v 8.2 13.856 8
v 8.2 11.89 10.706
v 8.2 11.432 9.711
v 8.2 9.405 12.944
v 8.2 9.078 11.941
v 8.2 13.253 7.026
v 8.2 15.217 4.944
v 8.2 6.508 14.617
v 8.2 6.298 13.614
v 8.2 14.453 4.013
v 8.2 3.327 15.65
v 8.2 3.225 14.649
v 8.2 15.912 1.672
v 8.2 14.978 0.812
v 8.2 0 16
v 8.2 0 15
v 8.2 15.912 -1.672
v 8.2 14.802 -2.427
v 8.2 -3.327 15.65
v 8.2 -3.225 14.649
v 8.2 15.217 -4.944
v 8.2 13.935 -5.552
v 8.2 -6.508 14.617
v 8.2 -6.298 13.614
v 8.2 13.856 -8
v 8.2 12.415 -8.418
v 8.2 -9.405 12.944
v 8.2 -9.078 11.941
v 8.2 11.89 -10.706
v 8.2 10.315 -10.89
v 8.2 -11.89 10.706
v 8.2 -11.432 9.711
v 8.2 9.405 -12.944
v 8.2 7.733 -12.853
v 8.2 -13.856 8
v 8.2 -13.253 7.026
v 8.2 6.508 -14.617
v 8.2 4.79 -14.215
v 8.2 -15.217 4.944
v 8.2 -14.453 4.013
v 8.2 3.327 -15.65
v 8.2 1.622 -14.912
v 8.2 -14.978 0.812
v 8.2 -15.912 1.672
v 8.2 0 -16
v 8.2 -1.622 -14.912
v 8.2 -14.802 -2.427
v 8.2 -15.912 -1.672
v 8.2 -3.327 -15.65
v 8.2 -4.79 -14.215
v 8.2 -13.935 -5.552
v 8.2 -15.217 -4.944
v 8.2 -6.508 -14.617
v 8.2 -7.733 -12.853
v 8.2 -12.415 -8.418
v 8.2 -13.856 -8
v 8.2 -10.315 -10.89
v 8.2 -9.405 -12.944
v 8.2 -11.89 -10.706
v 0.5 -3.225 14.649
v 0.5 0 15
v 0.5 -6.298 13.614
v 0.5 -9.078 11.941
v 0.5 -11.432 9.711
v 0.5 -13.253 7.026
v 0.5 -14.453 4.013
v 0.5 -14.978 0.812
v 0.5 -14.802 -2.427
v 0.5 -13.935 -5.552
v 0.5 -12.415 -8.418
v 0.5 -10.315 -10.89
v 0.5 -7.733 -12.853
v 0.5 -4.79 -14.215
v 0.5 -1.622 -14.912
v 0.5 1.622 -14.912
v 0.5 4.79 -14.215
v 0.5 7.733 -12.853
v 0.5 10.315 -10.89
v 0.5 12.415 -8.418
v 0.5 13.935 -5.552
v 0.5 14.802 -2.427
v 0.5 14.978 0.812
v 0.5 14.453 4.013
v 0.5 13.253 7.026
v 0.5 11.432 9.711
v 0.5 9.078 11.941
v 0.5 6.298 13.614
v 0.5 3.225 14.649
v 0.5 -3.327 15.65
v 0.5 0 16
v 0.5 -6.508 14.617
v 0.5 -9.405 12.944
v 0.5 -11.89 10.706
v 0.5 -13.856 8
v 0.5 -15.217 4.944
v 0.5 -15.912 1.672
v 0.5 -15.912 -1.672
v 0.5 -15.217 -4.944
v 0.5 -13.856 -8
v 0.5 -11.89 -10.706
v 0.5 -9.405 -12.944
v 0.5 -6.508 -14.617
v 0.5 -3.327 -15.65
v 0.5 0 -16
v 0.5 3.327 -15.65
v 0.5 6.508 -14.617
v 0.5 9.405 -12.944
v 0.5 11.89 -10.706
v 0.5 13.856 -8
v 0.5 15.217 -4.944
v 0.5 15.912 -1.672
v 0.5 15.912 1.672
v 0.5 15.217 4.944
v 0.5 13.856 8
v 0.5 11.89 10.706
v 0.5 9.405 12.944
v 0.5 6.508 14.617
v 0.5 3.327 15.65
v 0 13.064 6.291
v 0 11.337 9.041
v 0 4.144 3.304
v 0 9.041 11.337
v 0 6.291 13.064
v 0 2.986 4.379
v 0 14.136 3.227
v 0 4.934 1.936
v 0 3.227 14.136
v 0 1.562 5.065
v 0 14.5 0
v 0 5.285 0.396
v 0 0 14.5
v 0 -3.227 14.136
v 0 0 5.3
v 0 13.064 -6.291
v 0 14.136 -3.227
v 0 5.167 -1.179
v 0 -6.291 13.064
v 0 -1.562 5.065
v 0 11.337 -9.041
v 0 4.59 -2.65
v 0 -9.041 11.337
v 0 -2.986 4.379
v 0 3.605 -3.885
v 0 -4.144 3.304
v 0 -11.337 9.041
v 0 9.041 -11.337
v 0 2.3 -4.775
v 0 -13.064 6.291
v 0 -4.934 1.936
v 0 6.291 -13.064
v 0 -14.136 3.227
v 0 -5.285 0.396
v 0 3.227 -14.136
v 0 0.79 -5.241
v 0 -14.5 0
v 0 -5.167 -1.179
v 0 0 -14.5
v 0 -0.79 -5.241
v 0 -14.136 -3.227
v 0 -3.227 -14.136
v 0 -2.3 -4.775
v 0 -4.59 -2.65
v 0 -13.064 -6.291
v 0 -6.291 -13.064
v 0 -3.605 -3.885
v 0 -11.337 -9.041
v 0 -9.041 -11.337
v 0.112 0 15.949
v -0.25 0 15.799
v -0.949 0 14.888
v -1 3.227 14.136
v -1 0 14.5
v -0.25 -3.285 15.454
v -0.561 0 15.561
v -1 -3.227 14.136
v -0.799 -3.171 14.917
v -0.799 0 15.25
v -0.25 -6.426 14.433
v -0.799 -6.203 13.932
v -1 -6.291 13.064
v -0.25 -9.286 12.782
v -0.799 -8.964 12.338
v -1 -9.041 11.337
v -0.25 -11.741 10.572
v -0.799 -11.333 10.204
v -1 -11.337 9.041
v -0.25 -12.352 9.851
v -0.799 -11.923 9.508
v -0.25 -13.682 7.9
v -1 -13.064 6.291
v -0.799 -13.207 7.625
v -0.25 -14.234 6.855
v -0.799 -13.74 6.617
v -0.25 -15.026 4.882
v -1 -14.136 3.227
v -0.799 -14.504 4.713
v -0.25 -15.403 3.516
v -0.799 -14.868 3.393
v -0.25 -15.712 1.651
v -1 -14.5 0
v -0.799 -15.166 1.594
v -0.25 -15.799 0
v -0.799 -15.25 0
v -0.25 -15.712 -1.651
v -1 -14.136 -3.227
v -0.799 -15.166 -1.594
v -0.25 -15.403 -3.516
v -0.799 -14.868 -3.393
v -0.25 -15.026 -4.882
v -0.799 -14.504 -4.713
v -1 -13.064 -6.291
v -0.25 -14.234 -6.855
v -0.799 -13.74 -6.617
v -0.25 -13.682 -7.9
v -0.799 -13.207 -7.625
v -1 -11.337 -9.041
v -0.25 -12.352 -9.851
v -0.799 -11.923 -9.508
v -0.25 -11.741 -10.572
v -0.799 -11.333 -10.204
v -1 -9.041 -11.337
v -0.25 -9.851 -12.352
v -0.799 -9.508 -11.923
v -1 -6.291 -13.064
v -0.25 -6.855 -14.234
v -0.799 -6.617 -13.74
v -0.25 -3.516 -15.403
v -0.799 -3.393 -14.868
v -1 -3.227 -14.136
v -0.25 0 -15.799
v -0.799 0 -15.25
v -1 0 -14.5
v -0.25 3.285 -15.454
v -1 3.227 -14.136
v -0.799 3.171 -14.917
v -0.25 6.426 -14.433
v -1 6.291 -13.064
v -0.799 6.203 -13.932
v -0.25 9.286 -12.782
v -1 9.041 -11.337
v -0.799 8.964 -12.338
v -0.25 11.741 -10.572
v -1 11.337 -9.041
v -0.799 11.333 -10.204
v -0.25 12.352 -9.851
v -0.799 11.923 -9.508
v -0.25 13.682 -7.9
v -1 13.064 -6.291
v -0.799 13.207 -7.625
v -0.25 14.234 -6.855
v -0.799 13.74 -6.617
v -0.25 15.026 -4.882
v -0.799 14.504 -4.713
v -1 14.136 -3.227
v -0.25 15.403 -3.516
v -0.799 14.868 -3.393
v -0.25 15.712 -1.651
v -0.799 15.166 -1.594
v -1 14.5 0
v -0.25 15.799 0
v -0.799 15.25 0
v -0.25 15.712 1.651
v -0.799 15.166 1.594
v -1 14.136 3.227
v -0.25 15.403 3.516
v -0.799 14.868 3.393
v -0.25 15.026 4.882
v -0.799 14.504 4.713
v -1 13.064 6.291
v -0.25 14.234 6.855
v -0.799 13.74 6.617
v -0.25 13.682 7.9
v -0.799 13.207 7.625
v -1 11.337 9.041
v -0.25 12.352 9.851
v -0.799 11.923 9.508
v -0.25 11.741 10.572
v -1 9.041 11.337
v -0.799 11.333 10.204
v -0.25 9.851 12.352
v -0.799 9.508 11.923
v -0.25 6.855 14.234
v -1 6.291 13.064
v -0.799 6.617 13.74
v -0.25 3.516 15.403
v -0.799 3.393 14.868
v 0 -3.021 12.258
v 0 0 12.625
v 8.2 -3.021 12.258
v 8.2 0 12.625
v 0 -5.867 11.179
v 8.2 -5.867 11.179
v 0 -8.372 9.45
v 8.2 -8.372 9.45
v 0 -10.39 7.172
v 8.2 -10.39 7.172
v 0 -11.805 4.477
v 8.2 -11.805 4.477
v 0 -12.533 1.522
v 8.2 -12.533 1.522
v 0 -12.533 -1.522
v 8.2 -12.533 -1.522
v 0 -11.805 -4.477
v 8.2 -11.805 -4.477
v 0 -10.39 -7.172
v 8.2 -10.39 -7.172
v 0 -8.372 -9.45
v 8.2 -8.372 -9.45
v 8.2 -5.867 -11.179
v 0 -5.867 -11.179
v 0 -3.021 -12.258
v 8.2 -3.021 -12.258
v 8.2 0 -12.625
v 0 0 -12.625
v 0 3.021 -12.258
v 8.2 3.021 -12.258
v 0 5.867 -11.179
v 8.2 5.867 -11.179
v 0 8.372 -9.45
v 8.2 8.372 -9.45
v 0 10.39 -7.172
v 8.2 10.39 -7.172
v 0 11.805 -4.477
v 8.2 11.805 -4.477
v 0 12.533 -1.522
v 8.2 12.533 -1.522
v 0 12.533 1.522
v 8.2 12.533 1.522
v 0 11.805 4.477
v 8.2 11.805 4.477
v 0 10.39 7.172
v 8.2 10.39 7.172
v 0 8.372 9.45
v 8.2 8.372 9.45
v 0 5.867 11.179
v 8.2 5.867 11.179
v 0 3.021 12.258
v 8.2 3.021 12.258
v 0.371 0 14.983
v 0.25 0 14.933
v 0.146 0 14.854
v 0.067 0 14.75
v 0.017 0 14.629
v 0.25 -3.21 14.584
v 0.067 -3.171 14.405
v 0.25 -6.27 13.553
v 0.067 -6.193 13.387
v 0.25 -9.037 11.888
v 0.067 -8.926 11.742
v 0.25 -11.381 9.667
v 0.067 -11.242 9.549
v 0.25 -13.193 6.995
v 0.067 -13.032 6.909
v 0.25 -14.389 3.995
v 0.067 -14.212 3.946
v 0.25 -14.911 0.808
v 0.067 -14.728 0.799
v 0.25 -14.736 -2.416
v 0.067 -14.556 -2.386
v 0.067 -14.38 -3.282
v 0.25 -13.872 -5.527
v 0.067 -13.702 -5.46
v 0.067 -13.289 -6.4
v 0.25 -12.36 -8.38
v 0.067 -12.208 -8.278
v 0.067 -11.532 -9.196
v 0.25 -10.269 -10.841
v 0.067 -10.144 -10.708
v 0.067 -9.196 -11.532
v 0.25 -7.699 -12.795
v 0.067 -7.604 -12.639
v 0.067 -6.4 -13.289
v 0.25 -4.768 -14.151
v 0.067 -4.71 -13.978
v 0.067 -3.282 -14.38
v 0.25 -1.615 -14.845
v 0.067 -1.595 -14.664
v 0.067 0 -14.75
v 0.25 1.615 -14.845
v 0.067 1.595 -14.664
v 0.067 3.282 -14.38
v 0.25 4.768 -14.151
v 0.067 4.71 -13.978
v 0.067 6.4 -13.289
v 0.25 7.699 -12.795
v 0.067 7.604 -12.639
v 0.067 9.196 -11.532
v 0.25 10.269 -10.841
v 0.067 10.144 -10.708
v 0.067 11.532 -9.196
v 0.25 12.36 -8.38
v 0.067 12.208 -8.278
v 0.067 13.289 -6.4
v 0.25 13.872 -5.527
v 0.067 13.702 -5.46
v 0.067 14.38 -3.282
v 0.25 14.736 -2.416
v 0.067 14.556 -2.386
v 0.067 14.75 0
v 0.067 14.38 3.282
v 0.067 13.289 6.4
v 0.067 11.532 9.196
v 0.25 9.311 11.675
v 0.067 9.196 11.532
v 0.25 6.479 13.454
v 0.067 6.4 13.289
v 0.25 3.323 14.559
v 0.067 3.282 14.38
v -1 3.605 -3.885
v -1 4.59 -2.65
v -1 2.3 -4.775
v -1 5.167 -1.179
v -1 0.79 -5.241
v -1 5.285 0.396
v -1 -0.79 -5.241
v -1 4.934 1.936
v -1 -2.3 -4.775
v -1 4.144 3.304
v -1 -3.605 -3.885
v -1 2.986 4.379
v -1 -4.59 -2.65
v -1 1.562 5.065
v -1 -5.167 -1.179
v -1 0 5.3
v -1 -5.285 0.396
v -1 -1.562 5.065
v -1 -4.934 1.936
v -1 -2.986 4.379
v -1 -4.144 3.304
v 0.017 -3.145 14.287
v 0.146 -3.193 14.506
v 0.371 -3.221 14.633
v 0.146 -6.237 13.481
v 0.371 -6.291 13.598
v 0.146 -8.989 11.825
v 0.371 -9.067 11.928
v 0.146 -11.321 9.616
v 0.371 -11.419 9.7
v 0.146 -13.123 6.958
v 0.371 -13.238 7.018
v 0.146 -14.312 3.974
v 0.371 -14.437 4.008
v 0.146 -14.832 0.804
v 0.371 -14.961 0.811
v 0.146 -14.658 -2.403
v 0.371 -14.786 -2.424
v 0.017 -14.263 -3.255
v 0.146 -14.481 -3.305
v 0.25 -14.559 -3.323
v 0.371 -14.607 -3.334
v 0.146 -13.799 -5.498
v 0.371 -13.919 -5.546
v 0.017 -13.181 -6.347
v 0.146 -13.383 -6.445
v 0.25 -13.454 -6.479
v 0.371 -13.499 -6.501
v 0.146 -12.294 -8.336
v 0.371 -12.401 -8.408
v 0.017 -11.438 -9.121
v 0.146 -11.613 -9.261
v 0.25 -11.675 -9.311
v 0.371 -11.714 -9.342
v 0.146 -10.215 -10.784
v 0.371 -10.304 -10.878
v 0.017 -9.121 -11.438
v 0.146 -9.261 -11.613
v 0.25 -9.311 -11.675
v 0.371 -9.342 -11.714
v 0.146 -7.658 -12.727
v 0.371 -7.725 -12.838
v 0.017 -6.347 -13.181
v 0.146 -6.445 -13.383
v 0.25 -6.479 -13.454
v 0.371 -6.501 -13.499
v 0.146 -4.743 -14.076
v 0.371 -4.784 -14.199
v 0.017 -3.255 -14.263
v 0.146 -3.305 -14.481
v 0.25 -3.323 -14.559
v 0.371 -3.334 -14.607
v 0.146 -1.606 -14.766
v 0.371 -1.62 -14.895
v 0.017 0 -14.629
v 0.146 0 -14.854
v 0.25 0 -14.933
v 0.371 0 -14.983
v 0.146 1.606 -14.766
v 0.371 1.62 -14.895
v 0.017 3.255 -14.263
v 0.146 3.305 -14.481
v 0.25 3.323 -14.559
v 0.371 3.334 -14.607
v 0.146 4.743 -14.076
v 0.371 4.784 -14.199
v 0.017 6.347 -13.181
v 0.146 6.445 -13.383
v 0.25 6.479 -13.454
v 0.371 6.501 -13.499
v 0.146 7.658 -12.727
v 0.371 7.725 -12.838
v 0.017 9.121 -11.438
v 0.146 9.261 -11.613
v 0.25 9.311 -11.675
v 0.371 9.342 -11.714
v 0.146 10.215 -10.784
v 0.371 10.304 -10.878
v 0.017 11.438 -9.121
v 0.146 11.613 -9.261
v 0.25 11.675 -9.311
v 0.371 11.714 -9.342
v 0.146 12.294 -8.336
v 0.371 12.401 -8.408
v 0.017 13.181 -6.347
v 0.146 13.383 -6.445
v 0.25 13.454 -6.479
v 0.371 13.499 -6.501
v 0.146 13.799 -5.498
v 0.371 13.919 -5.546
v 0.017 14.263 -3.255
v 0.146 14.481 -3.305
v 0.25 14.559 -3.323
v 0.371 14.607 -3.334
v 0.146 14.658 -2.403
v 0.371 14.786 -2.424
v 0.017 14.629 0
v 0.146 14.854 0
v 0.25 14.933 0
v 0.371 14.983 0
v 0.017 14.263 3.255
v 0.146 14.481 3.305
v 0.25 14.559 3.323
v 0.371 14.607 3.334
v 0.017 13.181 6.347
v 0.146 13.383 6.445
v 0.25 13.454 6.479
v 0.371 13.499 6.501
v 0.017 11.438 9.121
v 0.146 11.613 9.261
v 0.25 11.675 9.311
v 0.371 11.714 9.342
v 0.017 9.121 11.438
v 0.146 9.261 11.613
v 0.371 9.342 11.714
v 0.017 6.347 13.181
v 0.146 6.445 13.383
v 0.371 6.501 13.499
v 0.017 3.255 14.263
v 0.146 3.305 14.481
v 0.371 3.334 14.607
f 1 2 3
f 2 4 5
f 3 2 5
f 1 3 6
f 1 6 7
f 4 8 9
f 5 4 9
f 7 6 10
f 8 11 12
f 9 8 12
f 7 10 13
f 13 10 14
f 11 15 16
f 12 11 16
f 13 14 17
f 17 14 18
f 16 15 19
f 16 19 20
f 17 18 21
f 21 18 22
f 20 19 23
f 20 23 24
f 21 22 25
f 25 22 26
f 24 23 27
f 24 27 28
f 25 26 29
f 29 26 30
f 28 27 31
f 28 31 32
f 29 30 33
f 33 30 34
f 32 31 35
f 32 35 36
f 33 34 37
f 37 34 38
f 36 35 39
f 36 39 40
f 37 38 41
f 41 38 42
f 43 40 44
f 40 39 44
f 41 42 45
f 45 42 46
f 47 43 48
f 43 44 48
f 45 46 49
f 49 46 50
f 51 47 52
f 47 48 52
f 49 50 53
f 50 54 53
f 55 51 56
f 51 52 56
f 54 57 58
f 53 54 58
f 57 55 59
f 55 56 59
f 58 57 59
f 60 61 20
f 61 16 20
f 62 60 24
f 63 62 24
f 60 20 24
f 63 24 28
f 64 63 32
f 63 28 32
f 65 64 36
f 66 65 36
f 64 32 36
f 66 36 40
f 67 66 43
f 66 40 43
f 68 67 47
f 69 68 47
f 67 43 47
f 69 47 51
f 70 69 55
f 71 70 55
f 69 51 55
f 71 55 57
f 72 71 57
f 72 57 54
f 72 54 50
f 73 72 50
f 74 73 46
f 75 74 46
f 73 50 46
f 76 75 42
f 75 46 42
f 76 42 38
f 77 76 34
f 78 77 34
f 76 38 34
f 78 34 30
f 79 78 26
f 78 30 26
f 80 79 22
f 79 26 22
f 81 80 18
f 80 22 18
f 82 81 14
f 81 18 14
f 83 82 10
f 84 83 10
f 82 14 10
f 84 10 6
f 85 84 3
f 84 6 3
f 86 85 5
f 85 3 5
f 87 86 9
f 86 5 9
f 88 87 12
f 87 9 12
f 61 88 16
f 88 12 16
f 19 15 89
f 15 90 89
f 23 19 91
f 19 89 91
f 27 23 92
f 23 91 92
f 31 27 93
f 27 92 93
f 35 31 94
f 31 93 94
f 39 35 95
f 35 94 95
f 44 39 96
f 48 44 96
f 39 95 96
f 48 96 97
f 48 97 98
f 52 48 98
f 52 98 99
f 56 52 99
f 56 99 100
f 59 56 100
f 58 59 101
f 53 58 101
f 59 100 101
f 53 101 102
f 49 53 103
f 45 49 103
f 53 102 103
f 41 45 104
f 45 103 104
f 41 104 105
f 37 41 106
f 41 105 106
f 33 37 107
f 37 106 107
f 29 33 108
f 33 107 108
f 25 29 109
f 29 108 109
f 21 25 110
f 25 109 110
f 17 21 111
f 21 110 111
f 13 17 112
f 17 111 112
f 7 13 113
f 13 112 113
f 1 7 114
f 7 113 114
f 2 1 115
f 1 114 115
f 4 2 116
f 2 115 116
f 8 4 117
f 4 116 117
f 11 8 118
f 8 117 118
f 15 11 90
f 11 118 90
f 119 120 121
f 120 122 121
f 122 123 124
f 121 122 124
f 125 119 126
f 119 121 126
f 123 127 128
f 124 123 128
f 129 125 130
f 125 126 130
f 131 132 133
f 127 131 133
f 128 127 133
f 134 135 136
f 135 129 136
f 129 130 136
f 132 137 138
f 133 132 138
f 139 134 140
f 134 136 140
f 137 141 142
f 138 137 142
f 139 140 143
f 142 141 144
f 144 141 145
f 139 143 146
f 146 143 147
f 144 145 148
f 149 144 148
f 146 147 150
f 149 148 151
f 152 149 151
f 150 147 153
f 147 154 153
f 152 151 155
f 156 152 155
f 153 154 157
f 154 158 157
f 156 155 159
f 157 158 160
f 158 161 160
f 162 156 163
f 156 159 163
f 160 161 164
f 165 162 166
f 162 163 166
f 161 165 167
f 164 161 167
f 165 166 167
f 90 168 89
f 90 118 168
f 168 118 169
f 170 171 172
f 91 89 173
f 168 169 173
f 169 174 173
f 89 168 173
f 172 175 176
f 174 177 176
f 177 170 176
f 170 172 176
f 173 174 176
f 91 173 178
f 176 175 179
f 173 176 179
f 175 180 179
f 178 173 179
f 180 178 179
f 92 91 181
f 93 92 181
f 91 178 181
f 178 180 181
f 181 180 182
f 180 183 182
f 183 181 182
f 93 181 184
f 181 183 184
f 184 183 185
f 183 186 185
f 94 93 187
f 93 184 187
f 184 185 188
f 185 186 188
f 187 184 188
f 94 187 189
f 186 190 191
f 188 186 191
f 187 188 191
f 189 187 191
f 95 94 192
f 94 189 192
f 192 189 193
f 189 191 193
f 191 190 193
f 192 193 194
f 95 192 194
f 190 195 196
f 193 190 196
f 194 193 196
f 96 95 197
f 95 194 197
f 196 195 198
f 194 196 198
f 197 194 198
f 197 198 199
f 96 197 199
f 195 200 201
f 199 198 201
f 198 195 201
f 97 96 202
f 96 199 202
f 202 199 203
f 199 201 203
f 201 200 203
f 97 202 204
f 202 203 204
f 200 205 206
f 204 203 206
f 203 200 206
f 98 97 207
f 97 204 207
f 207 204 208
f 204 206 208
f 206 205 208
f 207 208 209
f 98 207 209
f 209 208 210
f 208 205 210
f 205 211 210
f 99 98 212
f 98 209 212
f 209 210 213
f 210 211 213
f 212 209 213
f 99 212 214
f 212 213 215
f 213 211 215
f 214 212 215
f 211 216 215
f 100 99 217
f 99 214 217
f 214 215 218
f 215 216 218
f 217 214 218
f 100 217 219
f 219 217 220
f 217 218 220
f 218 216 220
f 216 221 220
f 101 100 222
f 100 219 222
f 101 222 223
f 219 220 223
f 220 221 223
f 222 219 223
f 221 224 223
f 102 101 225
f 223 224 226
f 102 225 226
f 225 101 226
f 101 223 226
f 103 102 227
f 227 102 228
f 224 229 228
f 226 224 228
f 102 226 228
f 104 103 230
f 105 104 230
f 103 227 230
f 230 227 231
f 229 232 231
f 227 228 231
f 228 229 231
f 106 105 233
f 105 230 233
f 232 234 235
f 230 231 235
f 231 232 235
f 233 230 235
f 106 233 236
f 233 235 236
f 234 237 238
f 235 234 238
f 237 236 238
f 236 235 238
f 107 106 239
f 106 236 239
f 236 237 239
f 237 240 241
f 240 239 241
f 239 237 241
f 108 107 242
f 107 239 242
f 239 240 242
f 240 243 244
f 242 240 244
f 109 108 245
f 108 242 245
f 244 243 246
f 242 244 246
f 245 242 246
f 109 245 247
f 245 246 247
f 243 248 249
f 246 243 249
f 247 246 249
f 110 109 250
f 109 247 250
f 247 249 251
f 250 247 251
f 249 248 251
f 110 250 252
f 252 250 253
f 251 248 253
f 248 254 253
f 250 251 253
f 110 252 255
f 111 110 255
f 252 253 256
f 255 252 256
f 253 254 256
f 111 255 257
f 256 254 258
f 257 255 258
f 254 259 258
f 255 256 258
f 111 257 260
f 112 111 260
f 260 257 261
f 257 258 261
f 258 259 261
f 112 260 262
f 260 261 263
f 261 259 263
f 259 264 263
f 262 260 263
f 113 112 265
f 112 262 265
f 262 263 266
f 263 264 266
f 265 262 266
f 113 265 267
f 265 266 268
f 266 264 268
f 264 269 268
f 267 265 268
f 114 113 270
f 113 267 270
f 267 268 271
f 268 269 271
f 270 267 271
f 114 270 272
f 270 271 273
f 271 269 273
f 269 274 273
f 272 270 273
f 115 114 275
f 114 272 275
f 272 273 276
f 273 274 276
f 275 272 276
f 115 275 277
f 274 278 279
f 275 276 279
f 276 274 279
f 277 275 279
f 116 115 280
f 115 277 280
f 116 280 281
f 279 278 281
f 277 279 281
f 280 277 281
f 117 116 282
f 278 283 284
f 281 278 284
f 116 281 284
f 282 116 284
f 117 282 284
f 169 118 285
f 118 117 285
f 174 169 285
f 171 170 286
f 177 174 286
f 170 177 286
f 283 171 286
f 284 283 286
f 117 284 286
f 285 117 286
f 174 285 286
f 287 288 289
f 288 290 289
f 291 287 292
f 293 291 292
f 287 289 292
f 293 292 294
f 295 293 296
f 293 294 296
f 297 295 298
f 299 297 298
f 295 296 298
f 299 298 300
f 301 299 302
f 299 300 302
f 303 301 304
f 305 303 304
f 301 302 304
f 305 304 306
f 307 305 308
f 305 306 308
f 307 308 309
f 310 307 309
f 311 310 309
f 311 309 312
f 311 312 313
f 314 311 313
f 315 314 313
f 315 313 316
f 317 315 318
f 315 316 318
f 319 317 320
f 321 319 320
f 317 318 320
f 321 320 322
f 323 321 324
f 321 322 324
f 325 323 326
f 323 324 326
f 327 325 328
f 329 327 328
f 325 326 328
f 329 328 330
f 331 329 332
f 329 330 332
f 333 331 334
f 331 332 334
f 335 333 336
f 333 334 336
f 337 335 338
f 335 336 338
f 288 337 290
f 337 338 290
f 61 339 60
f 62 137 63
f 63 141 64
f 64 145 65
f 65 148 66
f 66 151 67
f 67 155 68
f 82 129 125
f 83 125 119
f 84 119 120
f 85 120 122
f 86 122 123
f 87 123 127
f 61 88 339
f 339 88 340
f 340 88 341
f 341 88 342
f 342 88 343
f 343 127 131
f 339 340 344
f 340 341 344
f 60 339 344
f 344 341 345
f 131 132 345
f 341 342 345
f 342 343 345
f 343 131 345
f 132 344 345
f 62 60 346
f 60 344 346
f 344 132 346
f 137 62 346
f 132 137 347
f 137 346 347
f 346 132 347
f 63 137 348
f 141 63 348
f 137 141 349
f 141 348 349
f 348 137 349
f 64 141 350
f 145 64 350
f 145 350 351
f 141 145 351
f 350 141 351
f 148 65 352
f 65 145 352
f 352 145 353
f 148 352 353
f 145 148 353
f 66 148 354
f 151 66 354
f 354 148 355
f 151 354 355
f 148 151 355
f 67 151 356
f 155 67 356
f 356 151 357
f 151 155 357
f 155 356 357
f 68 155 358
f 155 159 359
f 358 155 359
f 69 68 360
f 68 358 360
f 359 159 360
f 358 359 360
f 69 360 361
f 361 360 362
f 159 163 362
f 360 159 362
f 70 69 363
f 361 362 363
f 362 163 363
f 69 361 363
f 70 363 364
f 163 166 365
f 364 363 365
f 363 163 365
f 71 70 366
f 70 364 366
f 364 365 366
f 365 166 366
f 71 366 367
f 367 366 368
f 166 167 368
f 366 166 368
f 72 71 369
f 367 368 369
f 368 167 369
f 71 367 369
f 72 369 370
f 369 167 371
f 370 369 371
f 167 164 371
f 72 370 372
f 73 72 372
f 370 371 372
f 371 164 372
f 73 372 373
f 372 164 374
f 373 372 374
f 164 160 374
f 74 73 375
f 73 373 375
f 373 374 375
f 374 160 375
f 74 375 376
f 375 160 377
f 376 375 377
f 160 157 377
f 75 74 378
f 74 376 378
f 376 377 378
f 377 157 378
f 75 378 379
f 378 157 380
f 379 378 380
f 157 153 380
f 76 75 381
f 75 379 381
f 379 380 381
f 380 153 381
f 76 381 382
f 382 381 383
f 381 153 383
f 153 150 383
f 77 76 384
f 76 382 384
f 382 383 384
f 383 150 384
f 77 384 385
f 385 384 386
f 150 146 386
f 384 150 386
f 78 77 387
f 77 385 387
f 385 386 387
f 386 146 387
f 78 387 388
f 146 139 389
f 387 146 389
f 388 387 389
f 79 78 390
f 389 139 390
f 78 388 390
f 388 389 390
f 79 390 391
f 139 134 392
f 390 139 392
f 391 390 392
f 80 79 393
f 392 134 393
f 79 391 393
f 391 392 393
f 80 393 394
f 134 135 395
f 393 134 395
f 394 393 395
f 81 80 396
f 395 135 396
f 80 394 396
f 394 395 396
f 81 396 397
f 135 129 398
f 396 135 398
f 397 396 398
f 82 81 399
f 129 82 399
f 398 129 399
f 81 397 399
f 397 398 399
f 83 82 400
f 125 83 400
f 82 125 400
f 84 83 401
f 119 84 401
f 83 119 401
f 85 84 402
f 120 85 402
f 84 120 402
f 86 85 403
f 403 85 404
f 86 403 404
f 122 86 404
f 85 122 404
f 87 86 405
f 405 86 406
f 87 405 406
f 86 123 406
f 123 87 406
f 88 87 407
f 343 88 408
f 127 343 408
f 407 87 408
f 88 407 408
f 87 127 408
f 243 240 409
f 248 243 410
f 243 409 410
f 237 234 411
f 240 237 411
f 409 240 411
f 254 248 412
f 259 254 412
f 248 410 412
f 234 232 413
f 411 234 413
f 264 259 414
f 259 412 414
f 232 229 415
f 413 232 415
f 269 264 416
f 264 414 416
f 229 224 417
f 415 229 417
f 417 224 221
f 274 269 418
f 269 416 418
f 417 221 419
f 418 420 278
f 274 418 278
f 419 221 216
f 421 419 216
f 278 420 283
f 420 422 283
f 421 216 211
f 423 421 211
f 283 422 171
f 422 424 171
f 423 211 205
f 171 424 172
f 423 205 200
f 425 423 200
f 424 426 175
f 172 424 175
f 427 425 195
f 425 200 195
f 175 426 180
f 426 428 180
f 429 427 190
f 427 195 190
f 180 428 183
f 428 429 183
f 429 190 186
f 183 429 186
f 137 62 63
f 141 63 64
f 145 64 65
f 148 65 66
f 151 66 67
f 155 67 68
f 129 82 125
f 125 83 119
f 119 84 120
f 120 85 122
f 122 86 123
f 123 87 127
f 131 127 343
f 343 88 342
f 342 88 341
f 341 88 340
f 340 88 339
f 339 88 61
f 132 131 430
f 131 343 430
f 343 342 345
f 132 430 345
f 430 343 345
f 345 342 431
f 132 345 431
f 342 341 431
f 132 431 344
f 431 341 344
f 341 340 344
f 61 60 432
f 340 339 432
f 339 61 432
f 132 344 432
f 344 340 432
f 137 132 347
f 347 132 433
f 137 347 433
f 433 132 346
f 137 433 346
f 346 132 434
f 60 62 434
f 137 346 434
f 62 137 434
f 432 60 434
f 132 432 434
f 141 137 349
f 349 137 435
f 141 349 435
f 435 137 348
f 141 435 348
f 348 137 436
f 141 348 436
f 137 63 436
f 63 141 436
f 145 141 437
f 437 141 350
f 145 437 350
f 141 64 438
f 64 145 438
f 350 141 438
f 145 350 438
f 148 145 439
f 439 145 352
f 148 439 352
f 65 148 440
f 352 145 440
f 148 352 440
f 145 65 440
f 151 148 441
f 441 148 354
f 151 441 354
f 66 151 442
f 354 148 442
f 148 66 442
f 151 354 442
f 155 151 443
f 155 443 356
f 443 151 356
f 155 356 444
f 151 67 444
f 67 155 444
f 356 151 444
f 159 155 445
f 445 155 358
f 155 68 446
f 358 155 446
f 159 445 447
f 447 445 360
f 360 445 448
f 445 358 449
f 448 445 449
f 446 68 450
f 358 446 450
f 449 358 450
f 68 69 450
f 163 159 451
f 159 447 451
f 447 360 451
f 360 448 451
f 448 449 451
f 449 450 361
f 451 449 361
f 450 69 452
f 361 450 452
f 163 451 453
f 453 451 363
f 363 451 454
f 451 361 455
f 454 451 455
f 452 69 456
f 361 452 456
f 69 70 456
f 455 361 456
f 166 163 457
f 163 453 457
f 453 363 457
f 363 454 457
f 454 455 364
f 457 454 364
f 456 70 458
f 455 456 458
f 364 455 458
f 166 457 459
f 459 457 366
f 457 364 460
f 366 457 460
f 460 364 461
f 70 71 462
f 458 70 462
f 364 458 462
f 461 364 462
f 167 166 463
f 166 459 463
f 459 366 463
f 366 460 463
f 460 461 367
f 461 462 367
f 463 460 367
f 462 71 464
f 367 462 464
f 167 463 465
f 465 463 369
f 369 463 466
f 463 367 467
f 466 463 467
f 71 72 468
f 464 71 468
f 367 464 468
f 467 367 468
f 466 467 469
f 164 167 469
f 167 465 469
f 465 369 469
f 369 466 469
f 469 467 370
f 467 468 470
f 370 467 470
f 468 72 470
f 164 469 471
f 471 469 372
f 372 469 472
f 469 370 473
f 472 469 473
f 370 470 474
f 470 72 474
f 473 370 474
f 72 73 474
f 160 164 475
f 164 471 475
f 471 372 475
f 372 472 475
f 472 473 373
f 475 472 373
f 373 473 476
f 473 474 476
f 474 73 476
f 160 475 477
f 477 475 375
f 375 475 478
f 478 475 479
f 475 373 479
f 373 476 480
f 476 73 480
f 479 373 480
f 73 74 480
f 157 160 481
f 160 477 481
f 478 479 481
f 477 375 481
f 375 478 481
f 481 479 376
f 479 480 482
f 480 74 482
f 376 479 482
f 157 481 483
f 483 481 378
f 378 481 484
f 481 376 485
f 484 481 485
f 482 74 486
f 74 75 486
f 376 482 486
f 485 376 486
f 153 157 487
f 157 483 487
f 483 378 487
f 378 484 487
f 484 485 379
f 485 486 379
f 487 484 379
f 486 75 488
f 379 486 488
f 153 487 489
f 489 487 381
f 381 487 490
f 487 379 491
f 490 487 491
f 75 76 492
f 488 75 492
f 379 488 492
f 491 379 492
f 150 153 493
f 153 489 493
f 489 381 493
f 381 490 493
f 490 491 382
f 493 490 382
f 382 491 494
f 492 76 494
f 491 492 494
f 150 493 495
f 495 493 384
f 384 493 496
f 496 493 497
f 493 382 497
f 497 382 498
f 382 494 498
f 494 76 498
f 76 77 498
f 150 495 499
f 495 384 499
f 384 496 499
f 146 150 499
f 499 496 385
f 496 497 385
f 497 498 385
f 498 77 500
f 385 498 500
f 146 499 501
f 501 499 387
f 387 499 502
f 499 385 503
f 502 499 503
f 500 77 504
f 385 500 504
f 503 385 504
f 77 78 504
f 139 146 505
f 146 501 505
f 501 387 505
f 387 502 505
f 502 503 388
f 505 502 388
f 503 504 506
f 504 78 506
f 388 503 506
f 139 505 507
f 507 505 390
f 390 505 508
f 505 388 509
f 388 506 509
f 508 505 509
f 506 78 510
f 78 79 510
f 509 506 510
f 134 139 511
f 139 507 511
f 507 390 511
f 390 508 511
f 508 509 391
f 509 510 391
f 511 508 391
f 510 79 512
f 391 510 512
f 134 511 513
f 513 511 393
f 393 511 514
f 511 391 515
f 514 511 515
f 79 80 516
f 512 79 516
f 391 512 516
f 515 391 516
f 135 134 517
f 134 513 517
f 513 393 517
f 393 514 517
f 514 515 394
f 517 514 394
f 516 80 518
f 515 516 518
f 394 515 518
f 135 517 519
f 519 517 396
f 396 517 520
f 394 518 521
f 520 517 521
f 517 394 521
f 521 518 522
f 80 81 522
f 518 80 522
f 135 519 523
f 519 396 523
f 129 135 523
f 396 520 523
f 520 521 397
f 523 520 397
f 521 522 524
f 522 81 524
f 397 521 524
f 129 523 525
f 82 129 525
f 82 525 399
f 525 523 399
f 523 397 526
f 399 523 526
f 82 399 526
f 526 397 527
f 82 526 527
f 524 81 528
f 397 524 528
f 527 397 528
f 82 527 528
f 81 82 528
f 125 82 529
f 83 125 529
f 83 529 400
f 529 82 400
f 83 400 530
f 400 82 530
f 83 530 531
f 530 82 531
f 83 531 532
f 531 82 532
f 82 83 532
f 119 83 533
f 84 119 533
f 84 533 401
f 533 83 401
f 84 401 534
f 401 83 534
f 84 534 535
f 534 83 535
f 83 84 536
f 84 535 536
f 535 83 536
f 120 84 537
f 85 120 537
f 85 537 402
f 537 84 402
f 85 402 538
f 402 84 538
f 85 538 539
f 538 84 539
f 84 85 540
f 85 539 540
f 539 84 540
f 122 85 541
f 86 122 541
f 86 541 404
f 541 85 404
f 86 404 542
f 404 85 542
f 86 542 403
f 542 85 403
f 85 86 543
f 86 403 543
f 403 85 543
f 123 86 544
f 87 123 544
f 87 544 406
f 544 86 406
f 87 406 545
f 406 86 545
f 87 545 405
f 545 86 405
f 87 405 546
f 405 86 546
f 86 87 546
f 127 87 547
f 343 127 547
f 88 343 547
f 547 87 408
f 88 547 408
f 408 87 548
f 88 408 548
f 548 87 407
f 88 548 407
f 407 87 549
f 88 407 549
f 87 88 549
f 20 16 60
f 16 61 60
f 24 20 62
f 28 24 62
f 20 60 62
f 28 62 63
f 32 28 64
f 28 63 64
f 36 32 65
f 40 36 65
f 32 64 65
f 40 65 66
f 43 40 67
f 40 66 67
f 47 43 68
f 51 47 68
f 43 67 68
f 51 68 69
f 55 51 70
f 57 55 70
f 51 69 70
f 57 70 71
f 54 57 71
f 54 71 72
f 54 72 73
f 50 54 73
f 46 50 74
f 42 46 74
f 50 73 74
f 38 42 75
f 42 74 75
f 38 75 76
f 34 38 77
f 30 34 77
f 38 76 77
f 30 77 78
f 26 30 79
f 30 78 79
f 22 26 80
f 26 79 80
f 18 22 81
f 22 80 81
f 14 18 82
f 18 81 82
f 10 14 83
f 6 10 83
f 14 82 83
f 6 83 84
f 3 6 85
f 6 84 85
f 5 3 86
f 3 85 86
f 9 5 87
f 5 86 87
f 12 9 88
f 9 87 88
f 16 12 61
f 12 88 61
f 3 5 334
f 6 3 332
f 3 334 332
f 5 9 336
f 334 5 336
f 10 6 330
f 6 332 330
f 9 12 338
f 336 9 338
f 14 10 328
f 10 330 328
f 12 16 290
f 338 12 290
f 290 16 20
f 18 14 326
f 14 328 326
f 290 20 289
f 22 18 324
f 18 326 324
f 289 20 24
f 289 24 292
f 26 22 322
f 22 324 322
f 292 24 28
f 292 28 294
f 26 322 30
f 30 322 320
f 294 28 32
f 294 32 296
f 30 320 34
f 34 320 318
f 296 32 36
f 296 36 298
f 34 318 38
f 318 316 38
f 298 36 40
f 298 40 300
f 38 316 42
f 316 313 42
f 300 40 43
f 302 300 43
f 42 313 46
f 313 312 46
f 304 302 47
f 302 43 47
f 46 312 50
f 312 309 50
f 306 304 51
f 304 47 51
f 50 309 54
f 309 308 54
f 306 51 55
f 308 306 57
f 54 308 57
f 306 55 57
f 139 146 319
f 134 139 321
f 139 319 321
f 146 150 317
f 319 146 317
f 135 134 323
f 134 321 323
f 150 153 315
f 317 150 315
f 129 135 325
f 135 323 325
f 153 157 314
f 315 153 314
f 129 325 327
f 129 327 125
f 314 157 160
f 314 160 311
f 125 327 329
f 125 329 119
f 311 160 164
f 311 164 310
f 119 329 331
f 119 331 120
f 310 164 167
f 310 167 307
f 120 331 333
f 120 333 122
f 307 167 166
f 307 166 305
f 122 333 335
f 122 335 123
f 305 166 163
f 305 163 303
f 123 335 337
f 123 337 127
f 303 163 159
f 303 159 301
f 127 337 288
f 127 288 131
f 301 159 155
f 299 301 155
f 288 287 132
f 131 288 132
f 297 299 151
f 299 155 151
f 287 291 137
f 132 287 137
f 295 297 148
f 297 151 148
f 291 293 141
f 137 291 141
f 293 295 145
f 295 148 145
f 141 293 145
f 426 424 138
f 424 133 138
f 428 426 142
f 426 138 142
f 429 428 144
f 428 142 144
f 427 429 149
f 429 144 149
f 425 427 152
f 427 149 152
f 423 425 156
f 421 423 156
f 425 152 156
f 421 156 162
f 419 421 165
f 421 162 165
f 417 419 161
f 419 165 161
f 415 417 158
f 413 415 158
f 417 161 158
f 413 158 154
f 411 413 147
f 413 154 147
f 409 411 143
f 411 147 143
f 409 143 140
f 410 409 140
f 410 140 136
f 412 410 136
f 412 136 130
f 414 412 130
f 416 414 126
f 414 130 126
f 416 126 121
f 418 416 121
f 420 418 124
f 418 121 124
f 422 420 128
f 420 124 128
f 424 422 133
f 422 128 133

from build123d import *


with BuildPart() as f1:
    # F0 (on Front) → F1 (revolve)
    with BuildSketch(Plane.XZ):
        with BuildLine():
            Line((-1, 5.3), (0, 5.3))
            Line((0, 5.3), (0, 14.5))
            ThreePointArc((0, 14.5), (0.146447, 14.853553), (0.5, 15))
            Line((0.5, 15), (8.2, 15))
            Line((8.2, 15), (8.2, 16))
            Line((8.2, 16), (0.5, 16))
            ThreePointArc((0.5, 16), (-0.56066, 15.56066), (-1, 14.5))
            Line((-1, 14.5), (-1, 5.3))
        make_face()
    revolve(axis=Axis((5.047445, 0, 0), (1, 0, 0)))


with BuildPart() as f3:
    # F2 (on Front) → F3 (revolve)
    with BuildSketch(Plane.XZ):
        with BuildLine():
            Line((8.2, 15), (0.5, 15))
            ThreePointArc((0.5, 15), (0.146447, 14.853553), (0, 14.5))
            Line((0, 14.5), (0, 12.625))
            Line((0, 12.625), (8.2, 12.625))
            Line((8.2, 12.625), (8.2, 15))
        make_face()
    revolve(axis=Axis((5.047445, 0, 0), (1, 0, 0)))


solid = Compound([f1.part, f3.part])
